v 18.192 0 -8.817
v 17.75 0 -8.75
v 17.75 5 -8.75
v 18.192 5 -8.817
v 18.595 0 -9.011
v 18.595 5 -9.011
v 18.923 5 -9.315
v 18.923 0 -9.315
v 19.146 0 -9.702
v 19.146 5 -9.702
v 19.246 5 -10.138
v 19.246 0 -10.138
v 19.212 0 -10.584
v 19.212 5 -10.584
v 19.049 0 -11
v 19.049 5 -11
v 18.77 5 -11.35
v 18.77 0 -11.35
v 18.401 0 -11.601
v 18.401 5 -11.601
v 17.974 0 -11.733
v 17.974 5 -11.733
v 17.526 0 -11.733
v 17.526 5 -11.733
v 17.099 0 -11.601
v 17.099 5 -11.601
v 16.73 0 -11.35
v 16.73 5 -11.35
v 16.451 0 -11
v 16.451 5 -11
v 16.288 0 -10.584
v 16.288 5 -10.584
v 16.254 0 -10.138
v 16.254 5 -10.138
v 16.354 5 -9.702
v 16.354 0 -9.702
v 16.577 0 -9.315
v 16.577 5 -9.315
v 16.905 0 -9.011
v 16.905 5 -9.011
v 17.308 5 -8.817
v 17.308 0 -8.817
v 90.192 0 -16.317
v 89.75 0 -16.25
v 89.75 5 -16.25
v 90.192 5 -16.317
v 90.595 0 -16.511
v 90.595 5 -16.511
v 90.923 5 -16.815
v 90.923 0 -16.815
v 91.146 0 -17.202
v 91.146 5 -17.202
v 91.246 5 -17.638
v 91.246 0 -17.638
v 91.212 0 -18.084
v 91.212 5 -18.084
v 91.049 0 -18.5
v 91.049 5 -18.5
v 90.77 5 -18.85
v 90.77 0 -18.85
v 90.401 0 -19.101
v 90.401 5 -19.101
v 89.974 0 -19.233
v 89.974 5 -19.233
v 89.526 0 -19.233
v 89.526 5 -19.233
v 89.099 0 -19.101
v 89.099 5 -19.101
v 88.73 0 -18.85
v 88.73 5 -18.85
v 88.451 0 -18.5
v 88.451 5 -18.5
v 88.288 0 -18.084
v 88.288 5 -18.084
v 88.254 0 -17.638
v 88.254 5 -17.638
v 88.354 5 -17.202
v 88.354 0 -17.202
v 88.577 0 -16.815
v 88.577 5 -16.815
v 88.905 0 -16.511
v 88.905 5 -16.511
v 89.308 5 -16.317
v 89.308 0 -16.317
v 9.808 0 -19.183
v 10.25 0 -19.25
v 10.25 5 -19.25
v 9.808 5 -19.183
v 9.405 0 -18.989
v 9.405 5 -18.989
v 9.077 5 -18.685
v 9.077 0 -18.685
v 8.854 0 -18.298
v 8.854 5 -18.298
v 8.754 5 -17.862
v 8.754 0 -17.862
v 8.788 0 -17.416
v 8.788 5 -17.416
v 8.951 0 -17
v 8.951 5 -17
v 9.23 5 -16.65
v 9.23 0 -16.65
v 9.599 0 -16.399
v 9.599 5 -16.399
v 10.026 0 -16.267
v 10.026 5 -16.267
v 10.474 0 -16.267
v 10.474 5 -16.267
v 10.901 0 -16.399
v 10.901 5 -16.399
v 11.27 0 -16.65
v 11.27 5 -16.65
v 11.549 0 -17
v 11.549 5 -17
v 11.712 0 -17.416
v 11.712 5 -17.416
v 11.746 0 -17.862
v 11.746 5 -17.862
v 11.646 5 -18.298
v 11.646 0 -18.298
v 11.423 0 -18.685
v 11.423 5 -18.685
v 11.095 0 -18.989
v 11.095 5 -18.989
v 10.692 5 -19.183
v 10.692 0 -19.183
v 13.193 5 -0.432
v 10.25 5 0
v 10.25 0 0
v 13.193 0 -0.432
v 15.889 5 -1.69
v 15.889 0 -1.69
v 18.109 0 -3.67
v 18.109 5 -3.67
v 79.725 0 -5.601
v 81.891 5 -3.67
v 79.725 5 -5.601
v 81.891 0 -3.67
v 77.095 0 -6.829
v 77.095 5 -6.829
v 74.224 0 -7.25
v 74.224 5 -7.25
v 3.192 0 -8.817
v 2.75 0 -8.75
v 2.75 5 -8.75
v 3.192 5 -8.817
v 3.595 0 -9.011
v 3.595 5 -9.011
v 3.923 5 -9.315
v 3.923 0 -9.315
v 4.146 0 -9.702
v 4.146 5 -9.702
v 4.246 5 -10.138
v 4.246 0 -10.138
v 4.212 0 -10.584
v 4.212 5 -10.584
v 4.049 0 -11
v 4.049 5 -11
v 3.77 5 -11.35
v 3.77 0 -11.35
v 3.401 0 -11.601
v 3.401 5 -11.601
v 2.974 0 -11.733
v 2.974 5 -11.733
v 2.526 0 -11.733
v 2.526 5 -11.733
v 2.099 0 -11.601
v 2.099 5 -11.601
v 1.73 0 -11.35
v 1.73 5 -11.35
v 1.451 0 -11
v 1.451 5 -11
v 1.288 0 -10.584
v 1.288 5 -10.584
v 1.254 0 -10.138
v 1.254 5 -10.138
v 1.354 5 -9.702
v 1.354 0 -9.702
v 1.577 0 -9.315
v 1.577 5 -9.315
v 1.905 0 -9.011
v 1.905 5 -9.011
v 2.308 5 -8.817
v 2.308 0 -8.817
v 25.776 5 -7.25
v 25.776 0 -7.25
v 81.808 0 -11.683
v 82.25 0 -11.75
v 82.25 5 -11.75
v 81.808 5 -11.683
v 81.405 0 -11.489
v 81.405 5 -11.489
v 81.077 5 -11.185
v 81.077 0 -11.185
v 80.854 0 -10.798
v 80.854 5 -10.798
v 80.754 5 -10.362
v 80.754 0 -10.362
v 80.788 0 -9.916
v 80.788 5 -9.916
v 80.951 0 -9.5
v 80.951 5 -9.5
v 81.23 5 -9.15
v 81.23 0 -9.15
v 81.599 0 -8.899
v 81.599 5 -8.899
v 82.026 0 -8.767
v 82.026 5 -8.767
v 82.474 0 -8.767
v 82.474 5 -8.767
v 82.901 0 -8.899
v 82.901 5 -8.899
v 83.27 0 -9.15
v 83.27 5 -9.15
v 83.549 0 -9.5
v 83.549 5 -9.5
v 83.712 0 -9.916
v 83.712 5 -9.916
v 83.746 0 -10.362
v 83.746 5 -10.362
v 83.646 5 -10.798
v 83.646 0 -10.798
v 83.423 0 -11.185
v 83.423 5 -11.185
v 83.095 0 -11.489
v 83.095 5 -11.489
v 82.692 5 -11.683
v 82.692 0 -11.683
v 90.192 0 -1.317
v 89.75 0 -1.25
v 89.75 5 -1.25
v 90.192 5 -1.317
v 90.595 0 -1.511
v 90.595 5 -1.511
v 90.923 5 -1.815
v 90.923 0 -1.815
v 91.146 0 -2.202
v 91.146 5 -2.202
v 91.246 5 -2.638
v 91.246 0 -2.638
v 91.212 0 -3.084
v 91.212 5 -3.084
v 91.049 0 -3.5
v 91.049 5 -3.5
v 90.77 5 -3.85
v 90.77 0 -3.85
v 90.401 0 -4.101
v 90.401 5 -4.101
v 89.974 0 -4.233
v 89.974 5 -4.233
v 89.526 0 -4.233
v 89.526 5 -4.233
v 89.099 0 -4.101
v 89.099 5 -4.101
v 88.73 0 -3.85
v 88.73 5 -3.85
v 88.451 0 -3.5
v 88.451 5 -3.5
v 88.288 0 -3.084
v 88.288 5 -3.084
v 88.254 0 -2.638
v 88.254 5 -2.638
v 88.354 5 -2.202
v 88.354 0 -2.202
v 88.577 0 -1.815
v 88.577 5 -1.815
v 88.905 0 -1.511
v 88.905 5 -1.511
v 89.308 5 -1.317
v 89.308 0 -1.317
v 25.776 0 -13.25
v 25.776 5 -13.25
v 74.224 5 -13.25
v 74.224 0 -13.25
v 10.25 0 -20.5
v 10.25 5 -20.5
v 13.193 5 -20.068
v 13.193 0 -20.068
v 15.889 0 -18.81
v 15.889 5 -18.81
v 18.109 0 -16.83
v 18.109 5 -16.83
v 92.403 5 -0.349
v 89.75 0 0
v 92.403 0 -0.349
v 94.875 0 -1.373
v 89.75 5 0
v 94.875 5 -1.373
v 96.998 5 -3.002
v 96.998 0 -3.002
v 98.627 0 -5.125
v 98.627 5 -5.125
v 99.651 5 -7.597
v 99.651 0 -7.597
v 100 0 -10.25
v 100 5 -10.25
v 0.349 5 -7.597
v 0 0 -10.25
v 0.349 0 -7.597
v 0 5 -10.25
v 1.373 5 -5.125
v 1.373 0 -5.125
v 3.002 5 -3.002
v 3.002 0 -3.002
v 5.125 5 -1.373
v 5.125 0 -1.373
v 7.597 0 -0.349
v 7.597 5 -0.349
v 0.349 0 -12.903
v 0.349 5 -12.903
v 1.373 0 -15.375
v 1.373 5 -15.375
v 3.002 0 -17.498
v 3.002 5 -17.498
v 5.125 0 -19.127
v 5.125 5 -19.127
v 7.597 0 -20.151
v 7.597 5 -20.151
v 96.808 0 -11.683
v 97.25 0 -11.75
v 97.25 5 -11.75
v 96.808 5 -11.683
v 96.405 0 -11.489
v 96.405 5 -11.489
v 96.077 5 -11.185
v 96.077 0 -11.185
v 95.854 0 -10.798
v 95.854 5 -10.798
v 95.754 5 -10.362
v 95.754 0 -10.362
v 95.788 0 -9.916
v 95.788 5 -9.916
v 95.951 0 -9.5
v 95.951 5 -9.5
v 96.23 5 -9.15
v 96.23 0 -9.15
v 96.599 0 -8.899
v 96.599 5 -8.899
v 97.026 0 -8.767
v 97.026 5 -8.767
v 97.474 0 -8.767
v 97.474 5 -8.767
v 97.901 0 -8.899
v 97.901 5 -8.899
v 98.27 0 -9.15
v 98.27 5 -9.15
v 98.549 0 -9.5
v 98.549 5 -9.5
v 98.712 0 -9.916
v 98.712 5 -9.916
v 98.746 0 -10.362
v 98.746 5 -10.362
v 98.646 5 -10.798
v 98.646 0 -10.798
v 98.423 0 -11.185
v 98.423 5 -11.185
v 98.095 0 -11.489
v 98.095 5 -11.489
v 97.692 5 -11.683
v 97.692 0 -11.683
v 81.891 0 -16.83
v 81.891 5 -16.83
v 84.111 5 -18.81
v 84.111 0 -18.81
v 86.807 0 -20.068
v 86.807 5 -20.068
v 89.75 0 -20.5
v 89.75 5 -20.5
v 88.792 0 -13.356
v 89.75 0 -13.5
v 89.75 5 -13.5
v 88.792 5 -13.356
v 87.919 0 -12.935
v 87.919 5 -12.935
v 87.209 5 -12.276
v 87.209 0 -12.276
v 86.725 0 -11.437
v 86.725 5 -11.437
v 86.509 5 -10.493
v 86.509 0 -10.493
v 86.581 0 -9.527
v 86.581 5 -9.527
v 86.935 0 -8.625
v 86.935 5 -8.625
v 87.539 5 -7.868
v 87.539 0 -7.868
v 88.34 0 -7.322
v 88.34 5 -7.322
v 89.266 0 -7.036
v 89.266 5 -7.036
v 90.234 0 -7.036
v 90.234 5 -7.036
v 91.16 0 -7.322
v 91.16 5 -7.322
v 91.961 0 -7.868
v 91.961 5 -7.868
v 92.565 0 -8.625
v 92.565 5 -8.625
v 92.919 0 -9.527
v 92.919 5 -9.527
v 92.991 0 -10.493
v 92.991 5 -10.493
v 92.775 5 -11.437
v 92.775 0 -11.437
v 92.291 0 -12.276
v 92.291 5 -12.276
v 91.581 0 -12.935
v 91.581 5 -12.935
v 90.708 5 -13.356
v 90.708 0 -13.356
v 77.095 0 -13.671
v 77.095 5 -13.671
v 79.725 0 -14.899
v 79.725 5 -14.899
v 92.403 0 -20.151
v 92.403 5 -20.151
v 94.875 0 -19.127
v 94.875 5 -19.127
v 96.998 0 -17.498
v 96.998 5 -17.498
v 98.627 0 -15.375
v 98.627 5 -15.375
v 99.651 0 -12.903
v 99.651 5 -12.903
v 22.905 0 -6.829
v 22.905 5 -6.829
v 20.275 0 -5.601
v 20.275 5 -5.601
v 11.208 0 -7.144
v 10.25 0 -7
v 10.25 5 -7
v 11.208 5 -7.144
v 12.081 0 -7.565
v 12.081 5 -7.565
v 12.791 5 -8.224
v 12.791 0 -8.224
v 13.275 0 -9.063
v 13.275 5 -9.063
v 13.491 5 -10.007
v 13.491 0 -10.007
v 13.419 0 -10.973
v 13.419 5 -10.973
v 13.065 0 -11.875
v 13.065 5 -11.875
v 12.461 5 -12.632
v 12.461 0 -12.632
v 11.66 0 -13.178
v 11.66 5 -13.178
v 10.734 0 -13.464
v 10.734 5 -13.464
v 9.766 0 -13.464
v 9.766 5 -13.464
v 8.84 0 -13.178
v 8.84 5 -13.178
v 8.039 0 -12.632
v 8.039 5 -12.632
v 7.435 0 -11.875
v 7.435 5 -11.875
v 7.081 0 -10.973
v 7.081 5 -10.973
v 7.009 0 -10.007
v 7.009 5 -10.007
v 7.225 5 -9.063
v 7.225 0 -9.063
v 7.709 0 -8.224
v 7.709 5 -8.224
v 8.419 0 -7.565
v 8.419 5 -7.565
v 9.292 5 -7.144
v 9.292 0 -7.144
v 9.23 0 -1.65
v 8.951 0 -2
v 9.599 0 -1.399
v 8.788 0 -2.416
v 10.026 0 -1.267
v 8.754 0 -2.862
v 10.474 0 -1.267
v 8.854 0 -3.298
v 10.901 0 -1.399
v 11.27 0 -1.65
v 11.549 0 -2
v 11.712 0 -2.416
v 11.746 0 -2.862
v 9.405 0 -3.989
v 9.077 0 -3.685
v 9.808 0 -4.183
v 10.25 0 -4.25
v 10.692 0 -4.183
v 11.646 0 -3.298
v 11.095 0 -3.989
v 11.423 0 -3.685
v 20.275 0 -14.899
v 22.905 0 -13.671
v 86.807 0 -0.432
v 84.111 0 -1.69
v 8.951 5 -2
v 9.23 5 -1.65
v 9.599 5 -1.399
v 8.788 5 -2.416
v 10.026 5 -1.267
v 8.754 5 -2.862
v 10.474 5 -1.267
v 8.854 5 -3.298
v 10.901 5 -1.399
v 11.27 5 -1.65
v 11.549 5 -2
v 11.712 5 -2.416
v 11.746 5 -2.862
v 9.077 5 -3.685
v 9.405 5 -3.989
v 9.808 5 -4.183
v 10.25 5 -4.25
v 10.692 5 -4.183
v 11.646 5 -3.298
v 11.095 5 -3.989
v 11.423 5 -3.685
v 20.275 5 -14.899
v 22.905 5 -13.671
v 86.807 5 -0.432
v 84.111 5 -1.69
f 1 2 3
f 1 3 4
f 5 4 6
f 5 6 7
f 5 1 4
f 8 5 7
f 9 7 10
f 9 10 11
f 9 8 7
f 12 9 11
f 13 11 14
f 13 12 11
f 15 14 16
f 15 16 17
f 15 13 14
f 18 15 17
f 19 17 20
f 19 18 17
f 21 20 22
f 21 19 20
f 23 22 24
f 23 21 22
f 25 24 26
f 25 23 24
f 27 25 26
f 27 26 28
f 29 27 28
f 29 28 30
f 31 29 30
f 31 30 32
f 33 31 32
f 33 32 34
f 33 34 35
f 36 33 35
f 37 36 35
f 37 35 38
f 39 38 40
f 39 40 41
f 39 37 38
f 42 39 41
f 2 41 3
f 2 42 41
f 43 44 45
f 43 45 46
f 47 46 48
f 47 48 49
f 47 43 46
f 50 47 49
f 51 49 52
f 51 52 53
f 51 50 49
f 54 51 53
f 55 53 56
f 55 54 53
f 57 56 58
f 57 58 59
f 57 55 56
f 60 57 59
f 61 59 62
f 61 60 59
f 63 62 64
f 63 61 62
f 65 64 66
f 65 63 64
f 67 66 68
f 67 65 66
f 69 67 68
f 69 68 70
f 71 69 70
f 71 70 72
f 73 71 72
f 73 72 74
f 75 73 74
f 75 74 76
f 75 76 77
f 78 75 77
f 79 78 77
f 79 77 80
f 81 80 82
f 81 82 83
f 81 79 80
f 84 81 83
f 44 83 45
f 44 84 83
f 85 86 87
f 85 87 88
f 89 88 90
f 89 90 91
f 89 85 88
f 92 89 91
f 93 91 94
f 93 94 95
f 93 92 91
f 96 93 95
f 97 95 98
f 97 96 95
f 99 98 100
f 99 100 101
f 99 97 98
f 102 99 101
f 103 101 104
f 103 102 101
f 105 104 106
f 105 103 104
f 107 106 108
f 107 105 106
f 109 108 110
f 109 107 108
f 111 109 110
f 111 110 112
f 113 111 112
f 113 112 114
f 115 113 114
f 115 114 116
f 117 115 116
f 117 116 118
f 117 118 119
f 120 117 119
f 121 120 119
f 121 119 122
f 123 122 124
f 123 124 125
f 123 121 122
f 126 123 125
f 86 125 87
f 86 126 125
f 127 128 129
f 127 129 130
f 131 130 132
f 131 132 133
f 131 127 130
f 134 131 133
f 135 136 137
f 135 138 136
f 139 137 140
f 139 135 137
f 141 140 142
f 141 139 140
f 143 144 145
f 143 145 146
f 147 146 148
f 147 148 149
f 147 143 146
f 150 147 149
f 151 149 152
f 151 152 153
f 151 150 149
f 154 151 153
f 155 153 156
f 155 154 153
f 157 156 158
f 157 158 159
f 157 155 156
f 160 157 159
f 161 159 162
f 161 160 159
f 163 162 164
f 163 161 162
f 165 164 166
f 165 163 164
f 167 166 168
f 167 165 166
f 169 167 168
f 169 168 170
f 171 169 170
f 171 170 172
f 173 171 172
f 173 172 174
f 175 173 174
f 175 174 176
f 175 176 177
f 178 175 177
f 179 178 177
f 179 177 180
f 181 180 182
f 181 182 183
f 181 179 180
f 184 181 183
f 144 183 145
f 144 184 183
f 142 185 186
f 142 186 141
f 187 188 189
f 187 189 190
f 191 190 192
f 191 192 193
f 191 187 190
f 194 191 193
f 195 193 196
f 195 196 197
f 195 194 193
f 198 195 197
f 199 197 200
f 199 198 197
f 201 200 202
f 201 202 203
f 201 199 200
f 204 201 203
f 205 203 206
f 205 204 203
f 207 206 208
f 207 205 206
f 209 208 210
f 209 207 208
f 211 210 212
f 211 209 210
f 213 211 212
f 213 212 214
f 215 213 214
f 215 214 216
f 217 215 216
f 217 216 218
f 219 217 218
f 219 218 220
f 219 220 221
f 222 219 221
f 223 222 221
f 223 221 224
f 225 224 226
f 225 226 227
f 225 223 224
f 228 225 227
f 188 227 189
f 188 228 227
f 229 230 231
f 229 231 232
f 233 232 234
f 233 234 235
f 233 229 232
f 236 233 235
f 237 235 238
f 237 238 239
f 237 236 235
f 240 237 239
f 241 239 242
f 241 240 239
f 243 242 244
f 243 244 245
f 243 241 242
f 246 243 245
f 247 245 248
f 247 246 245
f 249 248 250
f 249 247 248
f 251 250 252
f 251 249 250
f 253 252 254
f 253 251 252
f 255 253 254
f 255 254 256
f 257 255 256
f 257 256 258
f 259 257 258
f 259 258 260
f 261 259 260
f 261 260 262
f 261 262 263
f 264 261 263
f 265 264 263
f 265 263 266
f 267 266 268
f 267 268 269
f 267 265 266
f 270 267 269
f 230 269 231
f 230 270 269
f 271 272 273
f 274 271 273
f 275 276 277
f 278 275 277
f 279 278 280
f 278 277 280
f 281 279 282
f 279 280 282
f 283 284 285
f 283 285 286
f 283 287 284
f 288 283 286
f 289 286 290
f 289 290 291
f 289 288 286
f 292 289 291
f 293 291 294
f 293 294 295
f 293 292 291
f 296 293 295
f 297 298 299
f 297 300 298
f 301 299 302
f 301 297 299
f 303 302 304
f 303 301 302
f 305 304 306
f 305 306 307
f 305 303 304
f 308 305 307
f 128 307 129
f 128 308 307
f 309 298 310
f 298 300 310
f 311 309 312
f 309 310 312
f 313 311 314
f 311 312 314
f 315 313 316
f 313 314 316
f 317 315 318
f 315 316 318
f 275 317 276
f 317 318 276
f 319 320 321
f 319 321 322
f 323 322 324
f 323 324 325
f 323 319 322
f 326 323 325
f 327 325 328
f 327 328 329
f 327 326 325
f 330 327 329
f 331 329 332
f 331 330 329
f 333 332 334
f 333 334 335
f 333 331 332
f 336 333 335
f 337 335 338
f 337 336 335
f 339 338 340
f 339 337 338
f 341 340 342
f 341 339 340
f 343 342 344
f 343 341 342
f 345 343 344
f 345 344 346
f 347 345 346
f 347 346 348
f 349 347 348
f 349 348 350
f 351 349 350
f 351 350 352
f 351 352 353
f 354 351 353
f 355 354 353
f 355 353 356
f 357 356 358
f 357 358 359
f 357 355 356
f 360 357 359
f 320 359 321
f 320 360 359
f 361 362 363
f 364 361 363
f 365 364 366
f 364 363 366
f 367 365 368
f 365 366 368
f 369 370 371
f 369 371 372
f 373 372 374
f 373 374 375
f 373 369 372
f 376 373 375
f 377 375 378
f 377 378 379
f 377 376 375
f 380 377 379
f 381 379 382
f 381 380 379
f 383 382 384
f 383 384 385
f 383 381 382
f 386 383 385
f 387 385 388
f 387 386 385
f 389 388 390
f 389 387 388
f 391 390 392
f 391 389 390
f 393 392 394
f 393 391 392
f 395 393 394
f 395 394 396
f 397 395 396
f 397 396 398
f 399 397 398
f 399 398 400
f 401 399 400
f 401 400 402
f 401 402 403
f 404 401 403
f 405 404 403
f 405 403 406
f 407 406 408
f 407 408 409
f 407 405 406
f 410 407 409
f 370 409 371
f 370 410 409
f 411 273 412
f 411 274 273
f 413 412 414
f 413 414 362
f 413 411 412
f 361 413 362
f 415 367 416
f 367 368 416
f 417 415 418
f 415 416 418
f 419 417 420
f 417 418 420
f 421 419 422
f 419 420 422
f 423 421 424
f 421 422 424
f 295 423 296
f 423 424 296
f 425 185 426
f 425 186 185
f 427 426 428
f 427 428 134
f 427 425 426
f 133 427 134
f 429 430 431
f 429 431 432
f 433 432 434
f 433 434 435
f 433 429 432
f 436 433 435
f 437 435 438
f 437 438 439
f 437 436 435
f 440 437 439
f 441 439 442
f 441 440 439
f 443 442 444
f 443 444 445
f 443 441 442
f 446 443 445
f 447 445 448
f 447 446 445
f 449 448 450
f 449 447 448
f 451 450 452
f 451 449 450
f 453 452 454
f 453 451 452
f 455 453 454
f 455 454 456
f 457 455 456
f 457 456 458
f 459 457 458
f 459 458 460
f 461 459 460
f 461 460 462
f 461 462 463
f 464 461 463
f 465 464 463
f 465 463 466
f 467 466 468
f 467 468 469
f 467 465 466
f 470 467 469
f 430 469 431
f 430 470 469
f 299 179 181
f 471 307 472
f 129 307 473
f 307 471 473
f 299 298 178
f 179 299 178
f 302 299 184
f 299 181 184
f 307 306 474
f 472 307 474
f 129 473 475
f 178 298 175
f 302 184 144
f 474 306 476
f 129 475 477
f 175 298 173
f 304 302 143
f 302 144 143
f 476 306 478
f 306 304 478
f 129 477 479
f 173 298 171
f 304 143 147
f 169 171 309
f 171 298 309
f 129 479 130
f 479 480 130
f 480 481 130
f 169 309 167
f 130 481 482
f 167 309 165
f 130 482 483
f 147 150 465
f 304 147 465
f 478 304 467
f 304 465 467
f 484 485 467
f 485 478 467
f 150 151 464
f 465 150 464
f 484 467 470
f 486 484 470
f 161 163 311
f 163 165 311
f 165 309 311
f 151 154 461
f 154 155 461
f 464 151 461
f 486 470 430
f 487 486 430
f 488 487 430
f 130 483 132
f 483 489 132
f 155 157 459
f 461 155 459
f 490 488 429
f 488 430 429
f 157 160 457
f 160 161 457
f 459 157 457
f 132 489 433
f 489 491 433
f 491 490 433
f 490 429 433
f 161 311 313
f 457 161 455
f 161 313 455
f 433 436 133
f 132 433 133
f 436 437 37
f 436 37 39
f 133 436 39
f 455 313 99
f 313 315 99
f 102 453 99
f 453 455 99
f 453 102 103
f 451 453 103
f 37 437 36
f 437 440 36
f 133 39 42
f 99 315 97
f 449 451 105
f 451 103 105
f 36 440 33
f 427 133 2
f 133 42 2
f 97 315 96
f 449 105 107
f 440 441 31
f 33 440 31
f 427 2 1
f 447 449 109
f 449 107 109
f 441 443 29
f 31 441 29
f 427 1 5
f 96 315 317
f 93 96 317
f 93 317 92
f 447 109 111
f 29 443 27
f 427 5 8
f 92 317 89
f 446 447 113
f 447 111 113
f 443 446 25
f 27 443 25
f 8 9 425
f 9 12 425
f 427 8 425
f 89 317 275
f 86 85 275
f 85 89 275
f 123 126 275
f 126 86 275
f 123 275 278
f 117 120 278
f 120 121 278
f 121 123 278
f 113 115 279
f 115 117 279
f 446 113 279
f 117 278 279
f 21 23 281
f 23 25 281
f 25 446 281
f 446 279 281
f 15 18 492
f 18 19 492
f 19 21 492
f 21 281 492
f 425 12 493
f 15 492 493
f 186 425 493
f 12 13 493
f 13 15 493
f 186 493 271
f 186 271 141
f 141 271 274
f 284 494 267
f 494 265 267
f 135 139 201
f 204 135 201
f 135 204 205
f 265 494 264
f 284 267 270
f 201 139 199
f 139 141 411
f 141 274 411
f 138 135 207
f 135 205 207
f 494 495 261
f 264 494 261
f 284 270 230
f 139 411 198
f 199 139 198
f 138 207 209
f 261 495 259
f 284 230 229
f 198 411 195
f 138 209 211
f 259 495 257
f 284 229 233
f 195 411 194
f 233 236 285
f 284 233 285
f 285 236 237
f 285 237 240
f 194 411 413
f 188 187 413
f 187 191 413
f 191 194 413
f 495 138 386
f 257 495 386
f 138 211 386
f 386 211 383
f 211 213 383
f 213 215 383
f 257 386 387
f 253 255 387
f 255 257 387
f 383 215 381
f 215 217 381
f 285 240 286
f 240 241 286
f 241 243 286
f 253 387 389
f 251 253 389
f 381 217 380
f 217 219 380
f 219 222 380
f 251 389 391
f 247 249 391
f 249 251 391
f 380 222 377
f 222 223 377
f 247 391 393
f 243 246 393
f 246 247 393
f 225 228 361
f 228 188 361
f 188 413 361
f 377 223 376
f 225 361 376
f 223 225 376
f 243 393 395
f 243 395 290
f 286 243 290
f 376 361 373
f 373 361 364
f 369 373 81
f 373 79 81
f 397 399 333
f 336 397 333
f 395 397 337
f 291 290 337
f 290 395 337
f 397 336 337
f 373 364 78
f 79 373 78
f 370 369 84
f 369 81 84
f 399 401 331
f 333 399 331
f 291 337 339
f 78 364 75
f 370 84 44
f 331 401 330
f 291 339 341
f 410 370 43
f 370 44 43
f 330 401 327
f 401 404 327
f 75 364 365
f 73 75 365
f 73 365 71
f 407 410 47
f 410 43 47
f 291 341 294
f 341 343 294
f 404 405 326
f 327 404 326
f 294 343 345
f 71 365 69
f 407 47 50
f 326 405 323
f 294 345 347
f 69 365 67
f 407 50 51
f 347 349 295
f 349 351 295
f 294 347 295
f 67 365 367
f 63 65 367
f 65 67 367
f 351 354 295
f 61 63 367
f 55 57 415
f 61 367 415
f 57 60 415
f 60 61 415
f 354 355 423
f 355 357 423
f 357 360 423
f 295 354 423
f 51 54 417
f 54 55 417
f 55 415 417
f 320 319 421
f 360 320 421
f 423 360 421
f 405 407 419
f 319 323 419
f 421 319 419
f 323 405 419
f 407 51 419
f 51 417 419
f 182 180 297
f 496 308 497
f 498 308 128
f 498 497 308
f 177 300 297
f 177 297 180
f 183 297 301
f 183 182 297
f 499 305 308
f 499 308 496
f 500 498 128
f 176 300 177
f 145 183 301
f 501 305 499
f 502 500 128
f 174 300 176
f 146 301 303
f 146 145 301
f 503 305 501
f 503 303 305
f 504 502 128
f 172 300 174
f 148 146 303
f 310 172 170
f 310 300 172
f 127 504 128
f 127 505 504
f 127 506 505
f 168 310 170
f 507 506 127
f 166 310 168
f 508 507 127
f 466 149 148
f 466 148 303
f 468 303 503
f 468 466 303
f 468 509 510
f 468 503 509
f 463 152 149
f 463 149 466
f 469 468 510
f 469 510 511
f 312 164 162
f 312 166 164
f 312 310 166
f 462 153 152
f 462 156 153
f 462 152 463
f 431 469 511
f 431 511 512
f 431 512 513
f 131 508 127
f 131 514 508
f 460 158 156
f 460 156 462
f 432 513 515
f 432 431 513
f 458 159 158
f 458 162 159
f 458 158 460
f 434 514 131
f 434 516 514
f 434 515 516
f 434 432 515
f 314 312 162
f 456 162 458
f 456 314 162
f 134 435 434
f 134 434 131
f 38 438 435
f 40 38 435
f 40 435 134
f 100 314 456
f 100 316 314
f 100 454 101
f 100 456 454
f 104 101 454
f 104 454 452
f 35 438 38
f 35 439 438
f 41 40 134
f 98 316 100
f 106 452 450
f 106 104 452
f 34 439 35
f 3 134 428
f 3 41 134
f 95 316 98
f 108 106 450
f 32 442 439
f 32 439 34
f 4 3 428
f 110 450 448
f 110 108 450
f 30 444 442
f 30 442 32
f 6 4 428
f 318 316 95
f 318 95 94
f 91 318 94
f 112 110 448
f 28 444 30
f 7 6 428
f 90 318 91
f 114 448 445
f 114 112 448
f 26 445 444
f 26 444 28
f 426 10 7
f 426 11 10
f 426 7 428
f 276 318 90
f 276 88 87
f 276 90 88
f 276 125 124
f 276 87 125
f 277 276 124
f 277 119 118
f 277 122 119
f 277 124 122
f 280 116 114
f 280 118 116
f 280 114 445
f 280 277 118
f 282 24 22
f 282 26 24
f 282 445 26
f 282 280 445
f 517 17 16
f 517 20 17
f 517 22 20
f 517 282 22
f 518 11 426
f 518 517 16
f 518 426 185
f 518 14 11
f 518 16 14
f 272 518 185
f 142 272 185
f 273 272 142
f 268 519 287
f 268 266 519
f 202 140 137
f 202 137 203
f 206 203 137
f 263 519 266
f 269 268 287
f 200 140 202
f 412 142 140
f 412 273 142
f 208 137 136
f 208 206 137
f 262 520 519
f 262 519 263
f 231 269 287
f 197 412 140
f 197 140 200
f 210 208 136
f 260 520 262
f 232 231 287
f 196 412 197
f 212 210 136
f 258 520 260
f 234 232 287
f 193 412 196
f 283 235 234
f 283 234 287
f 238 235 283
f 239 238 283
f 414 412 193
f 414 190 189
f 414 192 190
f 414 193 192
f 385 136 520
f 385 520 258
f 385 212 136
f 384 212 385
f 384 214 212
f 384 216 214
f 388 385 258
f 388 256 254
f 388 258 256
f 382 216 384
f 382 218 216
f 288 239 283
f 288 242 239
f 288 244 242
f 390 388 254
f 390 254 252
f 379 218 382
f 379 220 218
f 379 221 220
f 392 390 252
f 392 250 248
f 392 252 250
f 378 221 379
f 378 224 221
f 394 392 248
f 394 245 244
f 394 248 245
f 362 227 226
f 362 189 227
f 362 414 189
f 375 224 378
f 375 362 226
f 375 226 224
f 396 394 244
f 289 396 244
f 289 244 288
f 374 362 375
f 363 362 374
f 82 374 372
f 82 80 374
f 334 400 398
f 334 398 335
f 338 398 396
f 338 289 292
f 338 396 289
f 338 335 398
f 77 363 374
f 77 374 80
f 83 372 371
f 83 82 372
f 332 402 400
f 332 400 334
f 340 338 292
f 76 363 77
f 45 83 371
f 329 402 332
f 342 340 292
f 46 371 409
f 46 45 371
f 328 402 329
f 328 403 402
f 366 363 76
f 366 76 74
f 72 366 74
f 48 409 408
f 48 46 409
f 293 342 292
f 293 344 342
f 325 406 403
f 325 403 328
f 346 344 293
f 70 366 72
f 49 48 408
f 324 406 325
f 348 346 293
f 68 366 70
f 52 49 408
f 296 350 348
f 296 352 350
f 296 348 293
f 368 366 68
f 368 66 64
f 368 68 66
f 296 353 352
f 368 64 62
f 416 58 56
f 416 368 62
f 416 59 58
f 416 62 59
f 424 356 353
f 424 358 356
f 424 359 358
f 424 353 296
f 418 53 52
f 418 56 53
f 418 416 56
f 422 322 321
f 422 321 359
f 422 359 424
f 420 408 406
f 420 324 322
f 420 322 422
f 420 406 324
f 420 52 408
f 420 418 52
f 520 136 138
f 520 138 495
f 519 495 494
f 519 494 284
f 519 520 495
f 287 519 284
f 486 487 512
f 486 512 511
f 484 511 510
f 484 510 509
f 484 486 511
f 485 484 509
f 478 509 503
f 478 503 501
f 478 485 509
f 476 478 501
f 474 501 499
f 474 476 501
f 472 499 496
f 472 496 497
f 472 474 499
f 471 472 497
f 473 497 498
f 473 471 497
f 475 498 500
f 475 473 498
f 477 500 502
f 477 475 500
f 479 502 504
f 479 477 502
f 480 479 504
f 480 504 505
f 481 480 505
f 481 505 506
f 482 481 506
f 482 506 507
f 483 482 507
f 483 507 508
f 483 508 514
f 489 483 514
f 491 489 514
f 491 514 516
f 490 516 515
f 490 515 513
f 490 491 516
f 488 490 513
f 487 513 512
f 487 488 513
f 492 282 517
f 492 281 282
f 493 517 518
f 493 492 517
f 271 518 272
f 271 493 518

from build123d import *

# Parameters (mm, degrees)
SKETCH1_W           = 100
SKETCH1_H           = 20.5
SKETCH1_R           = 3.25
SKETCH1_R_2         = 1.5
BOSS_EXTRUDE1_DEPTH = 5
FILLET1_R           = 10.25
CUT_EXTRUDE1_DEPTH  = 10
FILLET2_R           = 10


with BuildPart() as part:
    # Sketch1 → Boss-Extrude1 (new body)
    with BuildSketch(Plane(origin=(0, 0, 0), x_dir=(1, 0, 0), z_dir=(0, 1, 0))):
        with Locations((50, 10.25)):
            Rectangle(SKETCH1_W, SKETCH1_H)
        with Locations(Location((10.25, 10.25, 0), (0, 0, 270))):
            Circle(SKETCH1_R, mode=Mode.SUBTRACT)
        with Locations(Location((17.75, 10.25, 0), (0, 0, 270))):
            Circle(SKETCH1_R_2, mode=Mode.SUBTRACT)
        with Locations(Location((10.25, 17.75, 0), (0, 0, 90))):
            Circle(SKETCH1_R_2, mode=Mode.SUBTRACT)
        with Locations(Location((10.25, 2.75, 0), (0, 0, 90))):
            Circle(SKETCH1_R_2, mode=Mode.SUBTRACT)
        with Locations(Location((2.75, 10.25, 0), (0, 0, 270))):
            Circle(SKETCH1_R_2, mode=Mode.SUBTRACT)
        with Locations(Location((82.25, 10.25, 0), (0, 0, 90))):
            Circle(SKETCH1_R_2, mode=Mode.SUBTRACT)
        with Locations(Location((89.75, 17.75, 0), (0, 0, 270))):
            Circle(SKETCH1_R_2, mode=Mode.SUBTRACT)
        with Locations(Location((89.75, 2.75, 0), (0, 0, 270))):
            Circle(SKETCH1_R_2, mode=Mode.SUBTRACT)
        with Locations(Location((97.25, 10.25, 0), (0, 0, 90))):
            Circle(SKETCH1_R_2, mode=Mode.SUBTRACT)
        with Locations(Location((89.75, 10.25, 0), (0, 0, 90))):
            Circle(SKETCH1_R, mode=Mode.SUBTRACT)
    extrude(amount=BOSS_EXTRUDE1_DEPTH)

    # Fillet1
    fillet1_edges = [part.edges().sort_by_distance(p)[0] for p in [
        (0, 2.5, 0),
        (0, 2.5, -20.5),
        (100, 2.5, -20.5),
        (100, 2.5, 0),
    ]]
    fillet(fillet1_edges, radius=FILLET1_R - 0.0001)  # a hair under: the kernel refuses the full size

    # Sketch2 → Cut-Extrude1 (cut)
    with BuildSketch(Plane(origin=(0, 5, 0), x_dir=(1, 0, 0), z_dir=(0, 1, 0))):
        with BuildLine():
            Line((20.051147892, 13.25), (79.948852108, 13.25))
            ThreePointArc((79.948852108, 13.25), (83.65440733, 18.490524862), (89.75, 20.5))
            Line((89.75, 20.5), (10.25, 20.5))
            ThreePointArc((10.25, 20.5), (16.34559267, 18.490524862), (20.051147892, 13.25))
        make_face()
        with BuildLine():
            Line((20.051147892, 7.25), (79.948852108, 7.25))
            ThreePointArc((79.948852108, 7.25), (83.65440733, 2.009475138), (89.75, 0))
            Line((89.75, 0), (10.25, 0))
            ThreePointArc((10.25, 0), (16.34559267, 2.009475138), (20.051147892, 7.25))
        make_face()
    extrude(amount=-CUT_EXTRUDE1_DEPTH, mode=Mode.SUBTRACT)

    # Fillet2
    fillet2_edges = [part.edges().sort_by_distance(p)[0] for p in [
        (20.051147892, 2.5, -13.25),
        (79.948852108, 2.5, -13.25),
        (79.948852108, 2.5, -7.25),
        (20.051147892, 2.5, -7.25),
    ]]
    fillet(fillet2_edges, radius=FILLET2_R)


solid = part.part
